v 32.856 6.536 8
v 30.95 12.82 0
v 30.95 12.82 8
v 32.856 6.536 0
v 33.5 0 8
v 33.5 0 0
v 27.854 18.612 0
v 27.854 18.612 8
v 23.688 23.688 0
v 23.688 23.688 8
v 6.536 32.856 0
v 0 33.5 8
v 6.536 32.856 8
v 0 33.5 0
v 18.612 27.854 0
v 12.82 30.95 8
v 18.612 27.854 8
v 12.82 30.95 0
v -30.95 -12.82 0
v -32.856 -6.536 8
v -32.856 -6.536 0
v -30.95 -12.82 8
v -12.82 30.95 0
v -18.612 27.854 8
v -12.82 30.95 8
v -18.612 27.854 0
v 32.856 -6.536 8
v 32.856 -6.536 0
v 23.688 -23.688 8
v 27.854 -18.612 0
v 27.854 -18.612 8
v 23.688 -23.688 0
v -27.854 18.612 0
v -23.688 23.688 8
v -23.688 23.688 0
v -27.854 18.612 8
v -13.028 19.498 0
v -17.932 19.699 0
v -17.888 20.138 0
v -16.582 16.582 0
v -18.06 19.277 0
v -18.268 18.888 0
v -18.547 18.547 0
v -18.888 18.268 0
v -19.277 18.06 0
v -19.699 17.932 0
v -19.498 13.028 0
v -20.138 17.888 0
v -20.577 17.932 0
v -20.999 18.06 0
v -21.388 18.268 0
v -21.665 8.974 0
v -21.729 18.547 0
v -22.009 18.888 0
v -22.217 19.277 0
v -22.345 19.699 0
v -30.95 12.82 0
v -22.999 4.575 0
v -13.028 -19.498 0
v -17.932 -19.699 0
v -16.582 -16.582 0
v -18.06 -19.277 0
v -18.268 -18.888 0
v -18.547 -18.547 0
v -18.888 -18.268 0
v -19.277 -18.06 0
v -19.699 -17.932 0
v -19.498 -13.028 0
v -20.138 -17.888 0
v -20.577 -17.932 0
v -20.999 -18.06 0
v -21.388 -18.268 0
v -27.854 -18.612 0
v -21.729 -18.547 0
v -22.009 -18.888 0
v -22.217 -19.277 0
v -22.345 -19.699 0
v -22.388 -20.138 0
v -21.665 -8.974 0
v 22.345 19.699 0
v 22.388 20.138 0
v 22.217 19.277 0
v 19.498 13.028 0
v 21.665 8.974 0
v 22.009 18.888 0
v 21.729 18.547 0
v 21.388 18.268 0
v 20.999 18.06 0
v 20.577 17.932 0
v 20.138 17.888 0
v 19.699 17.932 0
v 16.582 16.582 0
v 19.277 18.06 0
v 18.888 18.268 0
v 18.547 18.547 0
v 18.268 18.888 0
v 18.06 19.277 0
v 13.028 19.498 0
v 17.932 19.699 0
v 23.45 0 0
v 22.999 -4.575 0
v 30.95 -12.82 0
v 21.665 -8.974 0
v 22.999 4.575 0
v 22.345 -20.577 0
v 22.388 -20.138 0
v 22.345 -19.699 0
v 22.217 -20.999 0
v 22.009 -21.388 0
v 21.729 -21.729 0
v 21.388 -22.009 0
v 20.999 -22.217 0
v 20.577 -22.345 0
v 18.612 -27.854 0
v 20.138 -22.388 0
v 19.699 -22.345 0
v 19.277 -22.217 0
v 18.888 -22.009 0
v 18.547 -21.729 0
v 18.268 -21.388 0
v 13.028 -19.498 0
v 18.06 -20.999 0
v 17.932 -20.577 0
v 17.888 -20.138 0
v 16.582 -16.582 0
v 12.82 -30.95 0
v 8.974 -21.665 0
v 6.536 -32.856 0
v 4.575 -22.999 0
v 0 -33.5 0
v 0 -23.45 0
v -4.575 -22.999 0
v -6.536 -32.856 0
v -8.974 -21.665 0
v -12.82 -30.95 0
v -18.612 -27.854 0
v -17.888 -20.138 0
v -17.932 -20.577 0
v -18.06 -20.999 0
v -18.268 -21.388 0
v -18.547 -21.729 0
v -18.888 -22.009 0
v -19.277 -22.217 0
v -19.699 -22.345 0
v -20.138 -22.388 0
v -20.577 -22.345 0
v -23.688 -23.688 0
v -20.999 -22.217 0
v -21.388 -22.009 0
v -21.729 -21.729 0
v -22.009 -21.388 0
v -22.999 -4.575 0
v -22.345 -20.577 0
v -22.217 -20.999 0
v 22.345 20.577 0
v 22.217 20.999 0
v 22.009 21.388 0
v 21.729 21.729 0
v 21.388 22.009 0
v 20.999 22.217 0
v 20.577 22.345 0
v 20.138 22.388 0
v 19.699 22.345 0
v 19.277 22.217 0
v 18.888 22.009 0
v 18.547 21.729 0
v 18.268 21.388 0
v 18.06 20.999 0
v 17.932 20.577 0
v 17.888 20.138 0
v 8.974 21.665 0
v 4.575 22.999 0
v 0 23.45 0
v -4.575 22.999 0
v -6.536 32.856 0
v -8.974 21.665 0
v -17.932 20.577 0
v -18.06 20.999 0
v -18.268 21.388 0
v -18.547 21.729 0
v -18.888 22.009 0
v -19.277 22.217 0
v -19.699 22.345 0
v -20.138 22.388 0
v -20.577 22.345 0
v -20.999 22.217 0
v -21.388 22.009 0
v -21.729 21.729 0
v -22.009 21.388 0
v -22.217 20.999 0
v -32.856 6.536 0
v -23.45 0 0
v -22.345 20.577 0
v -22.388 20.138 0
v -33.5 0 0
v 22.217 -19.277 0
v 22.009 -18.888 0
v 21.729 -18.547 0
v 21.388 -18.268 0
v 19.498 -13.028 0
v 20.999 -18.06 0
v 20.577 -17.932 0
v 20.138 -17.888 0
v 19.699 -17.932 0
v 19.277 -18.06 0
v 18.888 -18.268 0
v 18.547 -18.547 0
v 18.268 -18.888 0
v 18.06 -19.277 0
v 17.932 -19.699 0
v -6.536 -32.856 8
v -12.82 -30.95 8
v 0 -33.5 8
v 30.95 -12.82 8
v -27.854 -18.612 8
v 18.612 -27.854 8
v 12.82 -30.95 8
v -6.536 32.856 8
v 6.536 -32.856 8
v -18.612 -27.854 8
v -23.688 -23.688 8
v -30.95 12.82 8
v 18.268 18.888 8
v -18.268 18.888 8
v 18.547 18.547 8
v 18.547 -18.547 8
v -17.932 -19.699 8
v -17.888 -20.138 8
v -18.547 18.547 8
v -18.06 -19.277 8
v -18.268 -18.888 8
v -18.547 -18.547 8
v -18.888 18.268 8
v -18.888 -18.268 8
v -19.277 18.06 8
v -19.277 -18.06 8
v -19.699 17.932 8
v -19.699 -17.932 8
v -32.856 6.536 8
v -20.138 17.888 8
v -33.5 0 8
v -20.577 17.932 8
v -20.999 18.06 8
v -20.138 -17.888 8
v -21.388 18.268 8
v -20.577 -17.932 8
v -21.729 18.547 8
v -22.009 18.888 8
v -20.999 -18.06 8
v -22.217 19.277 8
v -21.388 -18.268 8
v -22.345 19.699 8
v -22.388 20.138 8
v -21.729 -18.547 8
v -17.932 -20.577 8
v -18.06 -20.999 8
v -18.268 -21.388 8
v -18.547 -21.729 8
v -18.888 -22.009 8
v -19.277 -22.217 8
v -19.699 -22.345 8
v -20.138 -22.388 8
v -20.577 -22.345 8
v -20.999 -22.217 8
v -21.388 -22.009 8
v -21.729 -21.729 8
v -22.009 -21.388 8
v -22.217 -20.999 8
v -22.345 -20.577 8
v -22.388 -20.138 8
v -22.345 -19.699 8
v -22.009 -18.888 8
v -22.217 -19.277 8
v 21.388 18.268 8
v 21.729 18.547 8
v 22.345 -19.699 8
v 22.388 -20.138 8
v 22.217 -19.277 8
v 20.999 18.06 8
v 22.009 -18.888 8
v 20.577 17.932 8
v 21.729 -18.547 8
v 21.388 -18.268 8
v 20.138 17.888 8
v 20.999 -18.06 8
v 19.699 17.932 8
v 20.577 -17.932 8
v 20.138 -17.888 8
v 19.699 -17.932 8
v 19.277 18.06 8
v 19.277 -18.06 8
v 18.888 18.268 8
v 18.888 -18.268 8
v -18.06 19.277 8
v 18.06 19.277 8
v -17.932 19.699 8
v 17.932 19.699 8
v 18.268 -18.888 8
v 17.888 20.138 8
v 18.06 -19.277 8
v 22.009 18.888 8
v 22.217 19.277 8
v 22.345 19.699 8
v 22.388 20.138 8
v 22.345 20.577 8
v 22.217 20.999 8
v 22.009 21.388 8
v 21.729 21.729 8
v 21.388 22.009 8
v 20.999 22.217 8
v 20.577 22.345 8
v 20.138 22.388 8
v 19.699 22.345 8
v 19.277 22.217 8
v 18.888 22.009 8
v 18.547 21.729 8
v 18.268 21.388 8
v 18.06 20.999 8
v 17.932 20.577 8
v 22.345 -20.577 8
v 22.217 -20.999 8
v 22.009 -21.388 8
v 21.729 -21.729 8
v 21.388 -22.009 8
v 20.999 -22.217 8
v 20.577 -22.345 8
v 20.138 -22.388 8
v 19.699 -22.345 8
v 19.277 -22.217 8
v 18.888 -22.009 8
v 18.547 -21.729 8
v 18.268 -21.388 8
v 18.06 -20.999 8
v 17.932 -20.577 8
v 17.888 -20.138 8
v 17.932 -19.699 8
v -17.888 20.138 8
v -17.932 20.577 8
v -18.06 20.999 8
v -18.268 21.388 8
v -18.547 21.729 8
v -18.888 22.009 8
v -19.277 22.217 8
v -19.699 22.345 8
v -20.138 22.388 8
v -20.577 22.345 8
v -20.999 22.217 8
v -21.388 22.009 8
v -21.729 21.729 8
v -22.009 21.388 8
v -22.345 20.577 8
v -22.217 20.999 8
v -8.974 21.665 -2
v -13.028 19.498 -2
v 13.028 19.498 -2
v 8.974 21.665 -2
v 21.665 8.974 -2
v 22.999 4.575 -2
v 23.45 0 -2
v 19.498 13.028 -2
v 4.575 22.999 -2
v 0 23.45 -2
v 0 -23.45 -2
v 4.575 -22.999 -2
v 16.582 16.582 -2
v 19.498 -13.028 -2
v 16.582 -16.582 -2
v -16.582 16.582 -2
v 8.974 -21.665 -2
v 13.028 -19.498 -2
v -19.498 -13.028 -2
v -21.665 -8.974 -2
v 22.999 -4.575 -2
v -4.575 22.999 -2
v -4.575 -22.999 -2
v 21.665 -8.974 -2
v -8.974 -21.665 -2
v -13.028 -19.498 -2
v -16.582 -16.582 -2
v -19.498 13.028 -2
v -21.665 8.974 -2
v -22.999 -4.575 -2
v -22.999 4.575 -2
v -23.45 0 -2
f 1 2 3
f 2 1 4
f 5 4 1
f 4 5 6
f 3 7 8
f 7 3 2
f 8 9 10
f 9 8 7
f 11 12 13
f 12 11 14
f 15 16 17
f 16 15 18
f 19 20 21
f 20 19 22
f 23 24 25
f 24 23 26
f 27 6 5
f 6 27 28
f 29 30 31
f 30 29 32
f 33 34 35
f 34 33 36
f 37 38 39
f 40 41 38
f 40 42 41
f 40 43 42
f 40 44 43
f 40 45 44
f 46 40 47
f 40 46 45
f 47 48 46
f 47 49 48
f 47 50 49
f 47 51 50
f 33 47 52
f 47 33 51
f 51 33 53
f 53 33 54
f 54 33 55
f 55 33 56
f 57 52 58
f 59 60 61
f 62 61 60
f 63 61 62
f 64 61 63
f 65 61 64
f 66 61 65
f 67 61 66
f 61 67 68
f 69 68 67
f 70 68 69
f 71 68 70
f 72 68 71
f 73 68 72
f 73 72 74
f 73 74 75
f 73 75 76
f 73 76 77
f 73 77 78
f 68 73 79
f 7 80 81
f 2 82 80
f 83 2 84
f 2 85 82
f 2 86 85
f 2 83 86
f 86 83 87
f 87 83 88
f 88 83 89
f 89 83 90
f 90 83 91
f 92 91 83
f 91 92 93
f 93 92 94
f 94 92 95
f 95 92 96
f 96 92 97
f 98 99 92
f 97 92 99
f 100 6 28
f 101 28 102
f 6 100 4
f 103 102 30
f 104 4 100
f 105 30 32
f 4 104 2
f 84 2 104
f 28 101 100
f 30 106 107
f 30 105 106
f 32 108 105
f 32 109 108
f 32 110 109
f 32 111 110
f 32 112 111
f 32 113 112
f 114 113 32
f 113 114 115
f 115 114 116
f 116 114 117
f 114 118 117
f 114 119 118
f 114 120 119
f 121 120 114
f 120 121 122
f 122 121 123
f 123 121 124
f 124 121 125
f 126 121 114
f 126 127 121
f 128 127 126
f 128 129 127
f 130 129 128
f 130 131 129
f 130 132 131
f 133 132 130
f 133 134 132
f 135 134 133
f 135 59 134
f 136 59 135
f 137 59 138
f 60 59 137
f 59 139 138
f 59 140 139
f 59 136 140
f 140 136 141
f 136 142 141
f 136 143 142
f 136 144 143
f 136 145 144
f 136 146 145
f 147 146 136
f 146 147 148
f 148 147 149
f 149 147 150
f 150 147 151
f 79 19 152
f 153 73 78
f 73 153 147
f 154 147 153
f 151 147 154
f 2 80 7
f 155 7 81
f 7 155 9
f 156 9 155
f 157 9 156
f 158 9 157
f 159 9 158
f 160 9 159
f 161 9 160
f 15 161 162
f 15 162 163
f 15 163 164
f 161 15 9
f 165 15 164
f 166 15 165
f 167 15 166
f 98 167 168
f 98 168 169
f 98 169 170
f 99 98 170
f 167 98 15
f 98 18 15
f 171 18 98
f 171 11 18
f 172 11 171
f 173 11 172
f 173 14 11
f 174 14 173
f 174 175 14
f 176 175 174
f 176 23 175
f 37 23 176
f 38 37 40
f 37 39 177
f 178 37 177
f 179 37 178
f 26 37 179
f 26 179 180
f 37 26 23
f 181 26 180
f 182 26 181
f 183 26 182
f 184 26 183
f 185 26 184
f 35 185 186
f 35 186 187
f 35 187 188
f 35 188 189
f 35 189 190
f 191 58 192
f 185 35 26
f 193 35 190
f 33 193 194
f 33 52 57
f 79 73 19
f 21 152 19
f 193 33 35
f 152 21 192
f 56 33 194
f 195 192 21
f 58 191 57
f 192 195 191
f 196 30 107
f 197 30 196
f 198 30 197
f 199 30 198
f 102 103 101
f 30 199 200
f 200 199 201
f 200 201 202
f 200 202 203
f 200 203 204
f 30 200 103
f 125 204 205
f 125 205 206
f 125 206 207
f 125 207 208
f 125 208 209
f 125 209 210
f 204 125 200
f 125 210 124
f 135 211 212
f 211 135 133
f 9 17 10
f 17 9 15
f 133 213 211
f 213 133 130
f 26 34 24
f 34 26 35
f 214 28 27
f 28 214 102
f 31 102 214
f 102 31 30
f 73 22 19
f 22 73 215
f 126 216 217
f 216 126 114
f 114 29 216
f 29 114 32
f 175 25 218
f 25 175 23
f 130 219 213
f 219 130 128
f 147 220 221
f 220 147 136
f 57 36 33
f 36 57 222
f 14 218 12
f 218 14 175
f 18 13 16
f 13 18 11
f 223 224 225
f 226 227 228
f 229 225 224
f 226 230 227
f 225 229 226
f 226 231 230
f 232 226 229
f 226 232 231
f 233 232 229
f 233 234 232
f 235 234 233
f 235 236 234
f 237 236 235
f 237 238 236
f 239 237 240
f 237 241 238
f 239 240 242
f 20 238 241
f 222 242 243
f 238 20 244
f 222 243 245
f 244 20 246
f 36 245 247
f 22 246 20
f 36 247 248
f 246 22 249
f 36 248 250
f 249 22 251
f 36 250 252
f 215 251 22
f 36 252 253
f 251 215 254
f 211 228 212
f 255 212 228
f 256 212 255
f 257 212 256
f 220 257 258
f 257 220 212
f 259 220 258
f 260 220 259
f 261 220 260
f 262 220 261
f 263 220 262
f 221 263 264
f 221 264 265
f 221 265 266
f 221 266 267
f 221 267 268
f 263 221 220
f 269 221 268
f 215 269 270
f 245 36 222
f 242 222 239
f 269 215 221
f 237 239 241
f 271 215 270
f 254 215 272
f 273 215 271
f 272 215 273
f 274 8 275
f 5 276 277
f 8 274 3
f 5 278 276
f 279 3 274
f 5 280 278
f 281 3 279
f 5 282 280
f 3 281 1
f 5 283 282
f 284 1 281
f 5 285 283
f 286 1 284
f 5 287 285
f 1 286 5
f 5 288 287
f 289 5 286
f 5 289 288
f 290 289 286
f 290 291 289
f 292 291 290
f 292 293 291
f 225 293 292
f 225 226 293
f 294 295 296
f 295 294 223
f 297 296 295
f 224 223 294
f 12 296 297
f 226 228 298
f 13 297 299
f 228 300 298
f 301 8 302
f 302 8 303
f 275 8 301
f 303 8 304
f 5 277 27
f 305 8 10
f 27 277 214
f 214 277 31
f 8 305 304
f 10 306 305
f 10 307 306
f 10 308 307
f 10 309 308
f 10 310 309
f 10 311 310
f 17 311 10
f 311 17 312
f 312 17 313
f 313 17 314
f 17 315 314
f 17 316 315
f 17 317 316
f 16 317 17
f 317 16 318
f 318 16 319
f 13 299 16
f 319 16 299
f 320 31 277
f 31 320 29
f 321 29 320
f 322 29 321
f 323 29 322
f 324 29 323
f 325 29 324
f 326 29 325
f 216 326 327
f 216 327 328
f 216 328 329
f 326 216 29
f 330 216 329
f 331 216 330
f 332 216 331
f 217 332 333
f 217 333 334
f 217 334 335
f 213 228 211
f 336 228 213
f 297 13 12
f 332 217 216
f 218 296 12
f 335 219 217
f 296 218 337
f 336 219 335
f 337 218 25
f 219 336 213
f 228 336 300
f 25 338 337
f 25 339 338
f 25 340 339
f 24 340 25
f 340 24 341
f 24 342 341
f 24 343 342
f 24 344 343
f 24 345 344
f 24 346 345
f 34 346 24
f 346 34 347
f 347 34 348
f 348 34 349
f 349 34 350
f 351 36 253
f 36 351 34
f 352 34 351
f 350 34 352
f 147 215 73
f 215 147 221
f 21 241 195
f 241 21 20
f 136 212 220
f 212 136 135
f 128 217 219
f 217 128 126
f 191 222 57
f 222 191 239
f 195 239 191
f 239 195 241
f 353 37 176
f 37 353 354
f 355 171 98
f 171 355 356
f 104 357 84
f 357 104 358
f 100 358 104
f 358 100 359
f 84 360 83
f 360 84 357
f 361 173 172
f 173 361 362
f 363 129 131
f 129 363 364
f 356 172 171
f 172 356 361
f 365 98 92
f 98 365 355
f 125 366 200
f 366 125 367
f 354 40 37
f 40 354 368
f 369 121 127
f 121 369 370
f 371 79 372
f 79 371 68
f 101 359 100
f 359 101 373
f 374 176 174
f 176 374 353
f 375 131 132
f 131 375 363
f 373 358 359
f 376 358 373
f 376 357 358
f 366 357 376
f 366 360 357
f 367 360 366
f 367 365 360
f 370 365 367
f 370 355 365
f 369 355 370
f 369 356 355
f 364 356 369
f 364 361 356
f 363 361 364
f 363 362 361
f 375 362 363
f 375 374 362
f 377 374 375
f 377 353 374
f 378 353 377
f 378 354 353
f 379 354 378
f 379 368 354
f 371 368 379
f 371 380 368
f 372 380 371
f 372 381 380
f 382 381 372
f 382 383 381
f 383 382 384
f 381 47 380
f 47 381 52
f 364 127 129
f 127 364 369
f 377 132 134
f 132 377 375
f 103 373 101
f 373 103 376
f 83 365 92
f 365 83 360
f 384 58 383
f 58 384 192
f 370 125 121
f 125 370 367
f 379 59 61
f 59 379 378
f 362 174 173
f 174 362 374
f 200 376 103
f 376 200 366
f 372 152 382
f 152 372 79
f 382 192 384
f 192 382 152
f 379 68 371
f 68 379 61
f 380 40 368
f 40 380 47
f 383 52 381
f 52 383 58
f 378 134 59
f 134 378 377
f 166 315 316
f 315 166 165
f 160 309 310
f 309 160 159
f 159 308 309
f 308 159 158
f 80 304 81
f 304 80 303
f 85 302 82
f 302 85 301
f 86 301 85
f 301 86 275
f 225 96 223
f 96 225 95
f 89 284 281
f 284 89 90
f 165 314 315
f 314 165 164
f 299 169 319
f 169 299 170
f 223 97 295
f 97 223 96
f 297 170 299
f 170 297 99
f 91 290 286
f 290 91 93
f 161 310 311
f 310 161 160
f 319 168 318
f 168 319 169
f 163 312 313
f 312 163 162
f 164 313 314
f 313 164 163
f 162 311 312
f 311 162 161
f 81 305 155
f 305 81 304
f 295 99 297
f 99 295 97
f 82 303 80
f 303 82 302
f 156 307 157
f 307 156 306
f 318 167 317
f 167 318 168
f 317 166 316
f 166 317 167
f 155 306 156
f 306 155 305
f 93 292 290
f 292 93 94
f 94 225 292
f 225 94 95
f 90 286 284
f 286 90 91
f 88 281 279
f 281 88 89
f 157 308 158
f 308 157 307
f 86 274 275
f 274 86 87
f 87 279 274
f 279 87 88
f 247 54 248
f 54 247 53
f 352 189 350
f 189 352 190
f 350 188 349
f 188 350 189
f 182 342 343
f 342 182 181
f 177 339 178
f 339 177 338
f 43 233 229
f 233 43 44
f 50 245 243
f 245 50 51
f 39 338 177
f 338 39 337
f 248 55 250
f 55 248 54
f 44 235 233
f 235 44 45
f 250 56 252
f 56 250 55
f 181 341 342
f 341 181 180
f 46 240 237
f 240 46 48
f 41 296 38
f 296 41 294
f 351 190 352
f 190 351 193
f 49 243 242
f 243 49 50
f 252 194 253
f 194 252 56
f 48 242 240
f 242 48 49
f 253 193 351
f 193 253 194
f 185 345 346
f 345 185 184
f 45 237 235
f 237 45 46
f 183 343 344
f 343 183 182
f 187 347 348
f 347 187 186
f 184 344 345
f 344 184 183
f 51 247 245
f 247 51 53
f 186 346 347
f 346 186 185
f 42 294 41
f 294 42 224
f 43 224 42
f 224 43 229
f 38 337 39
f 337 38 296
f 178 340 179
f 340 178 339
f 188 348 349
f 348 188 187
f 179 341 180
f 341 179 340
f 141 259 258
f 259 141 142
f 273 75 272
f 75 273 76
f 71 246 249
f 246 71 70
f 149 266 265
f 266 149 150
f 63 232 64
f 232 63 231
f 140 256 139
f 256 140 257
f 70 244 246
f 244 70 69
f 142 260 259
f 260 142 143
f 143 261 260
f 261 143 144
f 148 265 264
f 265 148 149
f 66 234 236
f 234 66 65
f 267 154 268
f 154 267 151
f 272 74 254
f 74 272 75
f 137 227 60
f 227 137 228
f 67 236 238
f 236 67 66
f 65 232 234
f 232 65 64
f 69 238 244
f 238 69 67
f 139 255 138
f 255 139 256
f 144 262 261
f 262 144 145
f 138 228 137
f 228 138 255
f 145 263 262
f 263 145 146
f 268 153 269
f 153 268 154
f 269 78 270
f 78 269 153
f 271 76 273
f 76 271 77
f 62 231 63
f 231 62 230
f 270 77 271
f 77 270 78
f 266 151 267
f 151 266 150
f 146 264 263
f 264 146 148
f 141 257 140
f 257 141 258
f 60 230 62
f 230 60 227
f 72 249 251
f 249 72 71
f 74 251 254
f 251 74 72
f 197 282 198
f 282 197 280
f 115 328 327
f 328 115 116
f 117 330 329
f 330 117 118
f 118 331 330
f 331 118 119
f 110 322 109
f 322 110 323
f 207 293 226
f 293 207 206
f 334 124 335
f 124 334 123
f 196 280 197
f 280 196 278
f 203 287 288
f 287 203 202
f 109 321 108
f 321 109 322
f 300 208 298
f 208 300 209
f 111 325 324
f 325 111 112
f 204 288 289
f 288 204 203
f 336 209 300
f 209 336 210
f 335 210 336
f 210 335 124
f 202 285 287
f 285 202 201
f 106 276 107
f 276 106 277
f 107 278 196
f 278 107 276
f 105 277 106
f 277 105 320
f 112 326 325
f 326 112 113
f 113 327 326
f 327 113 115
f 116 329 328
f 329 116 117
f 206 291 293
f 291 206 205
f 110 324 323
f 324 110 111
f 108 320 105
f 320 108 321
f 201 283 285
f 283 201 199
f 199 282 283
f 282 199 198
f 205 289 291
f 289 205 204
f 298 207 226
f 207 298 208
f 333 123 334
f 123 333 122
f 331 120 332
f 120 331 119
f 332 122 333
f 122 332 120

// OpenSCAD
$fn = 32;

// ----------------------------------------------------------------------
// Retaining cap: 6005 cover, 67 mm, spigot 46.9 mm
// ----------------------------------------------------------------------

// --- parameters (mm) ---
plate_d = 67;             // cover diameter
plate_t = 8;              // cover thickness
boss_d = 46.9;            // spigot that enters the housing
boss_h = 2;               // spigot height
bolt_d = 4.5;             // bolt clearance
bolt_r = 28.48;           // bolt circle radius

module cover() {
  cylinder(h = plate_t, d = plate_d);
}

module spigot() {
  /* sunk 1 mm into the cover; the spigot sets the overall height */
  translate([0, 0, -boss_h]) cylinder(h = boss_h + 1, d = boss_d);
}

difference() {
  union() {
    cover();
    spigot();
  }
  for (i = [0 : 3]) rotate([0, 0, 45 + i * 90]) translate([bolt_r, 0, -boss_h - 1])
    cylinder(h = boss_h + plate_t + 2, d = bolt_d);
}
